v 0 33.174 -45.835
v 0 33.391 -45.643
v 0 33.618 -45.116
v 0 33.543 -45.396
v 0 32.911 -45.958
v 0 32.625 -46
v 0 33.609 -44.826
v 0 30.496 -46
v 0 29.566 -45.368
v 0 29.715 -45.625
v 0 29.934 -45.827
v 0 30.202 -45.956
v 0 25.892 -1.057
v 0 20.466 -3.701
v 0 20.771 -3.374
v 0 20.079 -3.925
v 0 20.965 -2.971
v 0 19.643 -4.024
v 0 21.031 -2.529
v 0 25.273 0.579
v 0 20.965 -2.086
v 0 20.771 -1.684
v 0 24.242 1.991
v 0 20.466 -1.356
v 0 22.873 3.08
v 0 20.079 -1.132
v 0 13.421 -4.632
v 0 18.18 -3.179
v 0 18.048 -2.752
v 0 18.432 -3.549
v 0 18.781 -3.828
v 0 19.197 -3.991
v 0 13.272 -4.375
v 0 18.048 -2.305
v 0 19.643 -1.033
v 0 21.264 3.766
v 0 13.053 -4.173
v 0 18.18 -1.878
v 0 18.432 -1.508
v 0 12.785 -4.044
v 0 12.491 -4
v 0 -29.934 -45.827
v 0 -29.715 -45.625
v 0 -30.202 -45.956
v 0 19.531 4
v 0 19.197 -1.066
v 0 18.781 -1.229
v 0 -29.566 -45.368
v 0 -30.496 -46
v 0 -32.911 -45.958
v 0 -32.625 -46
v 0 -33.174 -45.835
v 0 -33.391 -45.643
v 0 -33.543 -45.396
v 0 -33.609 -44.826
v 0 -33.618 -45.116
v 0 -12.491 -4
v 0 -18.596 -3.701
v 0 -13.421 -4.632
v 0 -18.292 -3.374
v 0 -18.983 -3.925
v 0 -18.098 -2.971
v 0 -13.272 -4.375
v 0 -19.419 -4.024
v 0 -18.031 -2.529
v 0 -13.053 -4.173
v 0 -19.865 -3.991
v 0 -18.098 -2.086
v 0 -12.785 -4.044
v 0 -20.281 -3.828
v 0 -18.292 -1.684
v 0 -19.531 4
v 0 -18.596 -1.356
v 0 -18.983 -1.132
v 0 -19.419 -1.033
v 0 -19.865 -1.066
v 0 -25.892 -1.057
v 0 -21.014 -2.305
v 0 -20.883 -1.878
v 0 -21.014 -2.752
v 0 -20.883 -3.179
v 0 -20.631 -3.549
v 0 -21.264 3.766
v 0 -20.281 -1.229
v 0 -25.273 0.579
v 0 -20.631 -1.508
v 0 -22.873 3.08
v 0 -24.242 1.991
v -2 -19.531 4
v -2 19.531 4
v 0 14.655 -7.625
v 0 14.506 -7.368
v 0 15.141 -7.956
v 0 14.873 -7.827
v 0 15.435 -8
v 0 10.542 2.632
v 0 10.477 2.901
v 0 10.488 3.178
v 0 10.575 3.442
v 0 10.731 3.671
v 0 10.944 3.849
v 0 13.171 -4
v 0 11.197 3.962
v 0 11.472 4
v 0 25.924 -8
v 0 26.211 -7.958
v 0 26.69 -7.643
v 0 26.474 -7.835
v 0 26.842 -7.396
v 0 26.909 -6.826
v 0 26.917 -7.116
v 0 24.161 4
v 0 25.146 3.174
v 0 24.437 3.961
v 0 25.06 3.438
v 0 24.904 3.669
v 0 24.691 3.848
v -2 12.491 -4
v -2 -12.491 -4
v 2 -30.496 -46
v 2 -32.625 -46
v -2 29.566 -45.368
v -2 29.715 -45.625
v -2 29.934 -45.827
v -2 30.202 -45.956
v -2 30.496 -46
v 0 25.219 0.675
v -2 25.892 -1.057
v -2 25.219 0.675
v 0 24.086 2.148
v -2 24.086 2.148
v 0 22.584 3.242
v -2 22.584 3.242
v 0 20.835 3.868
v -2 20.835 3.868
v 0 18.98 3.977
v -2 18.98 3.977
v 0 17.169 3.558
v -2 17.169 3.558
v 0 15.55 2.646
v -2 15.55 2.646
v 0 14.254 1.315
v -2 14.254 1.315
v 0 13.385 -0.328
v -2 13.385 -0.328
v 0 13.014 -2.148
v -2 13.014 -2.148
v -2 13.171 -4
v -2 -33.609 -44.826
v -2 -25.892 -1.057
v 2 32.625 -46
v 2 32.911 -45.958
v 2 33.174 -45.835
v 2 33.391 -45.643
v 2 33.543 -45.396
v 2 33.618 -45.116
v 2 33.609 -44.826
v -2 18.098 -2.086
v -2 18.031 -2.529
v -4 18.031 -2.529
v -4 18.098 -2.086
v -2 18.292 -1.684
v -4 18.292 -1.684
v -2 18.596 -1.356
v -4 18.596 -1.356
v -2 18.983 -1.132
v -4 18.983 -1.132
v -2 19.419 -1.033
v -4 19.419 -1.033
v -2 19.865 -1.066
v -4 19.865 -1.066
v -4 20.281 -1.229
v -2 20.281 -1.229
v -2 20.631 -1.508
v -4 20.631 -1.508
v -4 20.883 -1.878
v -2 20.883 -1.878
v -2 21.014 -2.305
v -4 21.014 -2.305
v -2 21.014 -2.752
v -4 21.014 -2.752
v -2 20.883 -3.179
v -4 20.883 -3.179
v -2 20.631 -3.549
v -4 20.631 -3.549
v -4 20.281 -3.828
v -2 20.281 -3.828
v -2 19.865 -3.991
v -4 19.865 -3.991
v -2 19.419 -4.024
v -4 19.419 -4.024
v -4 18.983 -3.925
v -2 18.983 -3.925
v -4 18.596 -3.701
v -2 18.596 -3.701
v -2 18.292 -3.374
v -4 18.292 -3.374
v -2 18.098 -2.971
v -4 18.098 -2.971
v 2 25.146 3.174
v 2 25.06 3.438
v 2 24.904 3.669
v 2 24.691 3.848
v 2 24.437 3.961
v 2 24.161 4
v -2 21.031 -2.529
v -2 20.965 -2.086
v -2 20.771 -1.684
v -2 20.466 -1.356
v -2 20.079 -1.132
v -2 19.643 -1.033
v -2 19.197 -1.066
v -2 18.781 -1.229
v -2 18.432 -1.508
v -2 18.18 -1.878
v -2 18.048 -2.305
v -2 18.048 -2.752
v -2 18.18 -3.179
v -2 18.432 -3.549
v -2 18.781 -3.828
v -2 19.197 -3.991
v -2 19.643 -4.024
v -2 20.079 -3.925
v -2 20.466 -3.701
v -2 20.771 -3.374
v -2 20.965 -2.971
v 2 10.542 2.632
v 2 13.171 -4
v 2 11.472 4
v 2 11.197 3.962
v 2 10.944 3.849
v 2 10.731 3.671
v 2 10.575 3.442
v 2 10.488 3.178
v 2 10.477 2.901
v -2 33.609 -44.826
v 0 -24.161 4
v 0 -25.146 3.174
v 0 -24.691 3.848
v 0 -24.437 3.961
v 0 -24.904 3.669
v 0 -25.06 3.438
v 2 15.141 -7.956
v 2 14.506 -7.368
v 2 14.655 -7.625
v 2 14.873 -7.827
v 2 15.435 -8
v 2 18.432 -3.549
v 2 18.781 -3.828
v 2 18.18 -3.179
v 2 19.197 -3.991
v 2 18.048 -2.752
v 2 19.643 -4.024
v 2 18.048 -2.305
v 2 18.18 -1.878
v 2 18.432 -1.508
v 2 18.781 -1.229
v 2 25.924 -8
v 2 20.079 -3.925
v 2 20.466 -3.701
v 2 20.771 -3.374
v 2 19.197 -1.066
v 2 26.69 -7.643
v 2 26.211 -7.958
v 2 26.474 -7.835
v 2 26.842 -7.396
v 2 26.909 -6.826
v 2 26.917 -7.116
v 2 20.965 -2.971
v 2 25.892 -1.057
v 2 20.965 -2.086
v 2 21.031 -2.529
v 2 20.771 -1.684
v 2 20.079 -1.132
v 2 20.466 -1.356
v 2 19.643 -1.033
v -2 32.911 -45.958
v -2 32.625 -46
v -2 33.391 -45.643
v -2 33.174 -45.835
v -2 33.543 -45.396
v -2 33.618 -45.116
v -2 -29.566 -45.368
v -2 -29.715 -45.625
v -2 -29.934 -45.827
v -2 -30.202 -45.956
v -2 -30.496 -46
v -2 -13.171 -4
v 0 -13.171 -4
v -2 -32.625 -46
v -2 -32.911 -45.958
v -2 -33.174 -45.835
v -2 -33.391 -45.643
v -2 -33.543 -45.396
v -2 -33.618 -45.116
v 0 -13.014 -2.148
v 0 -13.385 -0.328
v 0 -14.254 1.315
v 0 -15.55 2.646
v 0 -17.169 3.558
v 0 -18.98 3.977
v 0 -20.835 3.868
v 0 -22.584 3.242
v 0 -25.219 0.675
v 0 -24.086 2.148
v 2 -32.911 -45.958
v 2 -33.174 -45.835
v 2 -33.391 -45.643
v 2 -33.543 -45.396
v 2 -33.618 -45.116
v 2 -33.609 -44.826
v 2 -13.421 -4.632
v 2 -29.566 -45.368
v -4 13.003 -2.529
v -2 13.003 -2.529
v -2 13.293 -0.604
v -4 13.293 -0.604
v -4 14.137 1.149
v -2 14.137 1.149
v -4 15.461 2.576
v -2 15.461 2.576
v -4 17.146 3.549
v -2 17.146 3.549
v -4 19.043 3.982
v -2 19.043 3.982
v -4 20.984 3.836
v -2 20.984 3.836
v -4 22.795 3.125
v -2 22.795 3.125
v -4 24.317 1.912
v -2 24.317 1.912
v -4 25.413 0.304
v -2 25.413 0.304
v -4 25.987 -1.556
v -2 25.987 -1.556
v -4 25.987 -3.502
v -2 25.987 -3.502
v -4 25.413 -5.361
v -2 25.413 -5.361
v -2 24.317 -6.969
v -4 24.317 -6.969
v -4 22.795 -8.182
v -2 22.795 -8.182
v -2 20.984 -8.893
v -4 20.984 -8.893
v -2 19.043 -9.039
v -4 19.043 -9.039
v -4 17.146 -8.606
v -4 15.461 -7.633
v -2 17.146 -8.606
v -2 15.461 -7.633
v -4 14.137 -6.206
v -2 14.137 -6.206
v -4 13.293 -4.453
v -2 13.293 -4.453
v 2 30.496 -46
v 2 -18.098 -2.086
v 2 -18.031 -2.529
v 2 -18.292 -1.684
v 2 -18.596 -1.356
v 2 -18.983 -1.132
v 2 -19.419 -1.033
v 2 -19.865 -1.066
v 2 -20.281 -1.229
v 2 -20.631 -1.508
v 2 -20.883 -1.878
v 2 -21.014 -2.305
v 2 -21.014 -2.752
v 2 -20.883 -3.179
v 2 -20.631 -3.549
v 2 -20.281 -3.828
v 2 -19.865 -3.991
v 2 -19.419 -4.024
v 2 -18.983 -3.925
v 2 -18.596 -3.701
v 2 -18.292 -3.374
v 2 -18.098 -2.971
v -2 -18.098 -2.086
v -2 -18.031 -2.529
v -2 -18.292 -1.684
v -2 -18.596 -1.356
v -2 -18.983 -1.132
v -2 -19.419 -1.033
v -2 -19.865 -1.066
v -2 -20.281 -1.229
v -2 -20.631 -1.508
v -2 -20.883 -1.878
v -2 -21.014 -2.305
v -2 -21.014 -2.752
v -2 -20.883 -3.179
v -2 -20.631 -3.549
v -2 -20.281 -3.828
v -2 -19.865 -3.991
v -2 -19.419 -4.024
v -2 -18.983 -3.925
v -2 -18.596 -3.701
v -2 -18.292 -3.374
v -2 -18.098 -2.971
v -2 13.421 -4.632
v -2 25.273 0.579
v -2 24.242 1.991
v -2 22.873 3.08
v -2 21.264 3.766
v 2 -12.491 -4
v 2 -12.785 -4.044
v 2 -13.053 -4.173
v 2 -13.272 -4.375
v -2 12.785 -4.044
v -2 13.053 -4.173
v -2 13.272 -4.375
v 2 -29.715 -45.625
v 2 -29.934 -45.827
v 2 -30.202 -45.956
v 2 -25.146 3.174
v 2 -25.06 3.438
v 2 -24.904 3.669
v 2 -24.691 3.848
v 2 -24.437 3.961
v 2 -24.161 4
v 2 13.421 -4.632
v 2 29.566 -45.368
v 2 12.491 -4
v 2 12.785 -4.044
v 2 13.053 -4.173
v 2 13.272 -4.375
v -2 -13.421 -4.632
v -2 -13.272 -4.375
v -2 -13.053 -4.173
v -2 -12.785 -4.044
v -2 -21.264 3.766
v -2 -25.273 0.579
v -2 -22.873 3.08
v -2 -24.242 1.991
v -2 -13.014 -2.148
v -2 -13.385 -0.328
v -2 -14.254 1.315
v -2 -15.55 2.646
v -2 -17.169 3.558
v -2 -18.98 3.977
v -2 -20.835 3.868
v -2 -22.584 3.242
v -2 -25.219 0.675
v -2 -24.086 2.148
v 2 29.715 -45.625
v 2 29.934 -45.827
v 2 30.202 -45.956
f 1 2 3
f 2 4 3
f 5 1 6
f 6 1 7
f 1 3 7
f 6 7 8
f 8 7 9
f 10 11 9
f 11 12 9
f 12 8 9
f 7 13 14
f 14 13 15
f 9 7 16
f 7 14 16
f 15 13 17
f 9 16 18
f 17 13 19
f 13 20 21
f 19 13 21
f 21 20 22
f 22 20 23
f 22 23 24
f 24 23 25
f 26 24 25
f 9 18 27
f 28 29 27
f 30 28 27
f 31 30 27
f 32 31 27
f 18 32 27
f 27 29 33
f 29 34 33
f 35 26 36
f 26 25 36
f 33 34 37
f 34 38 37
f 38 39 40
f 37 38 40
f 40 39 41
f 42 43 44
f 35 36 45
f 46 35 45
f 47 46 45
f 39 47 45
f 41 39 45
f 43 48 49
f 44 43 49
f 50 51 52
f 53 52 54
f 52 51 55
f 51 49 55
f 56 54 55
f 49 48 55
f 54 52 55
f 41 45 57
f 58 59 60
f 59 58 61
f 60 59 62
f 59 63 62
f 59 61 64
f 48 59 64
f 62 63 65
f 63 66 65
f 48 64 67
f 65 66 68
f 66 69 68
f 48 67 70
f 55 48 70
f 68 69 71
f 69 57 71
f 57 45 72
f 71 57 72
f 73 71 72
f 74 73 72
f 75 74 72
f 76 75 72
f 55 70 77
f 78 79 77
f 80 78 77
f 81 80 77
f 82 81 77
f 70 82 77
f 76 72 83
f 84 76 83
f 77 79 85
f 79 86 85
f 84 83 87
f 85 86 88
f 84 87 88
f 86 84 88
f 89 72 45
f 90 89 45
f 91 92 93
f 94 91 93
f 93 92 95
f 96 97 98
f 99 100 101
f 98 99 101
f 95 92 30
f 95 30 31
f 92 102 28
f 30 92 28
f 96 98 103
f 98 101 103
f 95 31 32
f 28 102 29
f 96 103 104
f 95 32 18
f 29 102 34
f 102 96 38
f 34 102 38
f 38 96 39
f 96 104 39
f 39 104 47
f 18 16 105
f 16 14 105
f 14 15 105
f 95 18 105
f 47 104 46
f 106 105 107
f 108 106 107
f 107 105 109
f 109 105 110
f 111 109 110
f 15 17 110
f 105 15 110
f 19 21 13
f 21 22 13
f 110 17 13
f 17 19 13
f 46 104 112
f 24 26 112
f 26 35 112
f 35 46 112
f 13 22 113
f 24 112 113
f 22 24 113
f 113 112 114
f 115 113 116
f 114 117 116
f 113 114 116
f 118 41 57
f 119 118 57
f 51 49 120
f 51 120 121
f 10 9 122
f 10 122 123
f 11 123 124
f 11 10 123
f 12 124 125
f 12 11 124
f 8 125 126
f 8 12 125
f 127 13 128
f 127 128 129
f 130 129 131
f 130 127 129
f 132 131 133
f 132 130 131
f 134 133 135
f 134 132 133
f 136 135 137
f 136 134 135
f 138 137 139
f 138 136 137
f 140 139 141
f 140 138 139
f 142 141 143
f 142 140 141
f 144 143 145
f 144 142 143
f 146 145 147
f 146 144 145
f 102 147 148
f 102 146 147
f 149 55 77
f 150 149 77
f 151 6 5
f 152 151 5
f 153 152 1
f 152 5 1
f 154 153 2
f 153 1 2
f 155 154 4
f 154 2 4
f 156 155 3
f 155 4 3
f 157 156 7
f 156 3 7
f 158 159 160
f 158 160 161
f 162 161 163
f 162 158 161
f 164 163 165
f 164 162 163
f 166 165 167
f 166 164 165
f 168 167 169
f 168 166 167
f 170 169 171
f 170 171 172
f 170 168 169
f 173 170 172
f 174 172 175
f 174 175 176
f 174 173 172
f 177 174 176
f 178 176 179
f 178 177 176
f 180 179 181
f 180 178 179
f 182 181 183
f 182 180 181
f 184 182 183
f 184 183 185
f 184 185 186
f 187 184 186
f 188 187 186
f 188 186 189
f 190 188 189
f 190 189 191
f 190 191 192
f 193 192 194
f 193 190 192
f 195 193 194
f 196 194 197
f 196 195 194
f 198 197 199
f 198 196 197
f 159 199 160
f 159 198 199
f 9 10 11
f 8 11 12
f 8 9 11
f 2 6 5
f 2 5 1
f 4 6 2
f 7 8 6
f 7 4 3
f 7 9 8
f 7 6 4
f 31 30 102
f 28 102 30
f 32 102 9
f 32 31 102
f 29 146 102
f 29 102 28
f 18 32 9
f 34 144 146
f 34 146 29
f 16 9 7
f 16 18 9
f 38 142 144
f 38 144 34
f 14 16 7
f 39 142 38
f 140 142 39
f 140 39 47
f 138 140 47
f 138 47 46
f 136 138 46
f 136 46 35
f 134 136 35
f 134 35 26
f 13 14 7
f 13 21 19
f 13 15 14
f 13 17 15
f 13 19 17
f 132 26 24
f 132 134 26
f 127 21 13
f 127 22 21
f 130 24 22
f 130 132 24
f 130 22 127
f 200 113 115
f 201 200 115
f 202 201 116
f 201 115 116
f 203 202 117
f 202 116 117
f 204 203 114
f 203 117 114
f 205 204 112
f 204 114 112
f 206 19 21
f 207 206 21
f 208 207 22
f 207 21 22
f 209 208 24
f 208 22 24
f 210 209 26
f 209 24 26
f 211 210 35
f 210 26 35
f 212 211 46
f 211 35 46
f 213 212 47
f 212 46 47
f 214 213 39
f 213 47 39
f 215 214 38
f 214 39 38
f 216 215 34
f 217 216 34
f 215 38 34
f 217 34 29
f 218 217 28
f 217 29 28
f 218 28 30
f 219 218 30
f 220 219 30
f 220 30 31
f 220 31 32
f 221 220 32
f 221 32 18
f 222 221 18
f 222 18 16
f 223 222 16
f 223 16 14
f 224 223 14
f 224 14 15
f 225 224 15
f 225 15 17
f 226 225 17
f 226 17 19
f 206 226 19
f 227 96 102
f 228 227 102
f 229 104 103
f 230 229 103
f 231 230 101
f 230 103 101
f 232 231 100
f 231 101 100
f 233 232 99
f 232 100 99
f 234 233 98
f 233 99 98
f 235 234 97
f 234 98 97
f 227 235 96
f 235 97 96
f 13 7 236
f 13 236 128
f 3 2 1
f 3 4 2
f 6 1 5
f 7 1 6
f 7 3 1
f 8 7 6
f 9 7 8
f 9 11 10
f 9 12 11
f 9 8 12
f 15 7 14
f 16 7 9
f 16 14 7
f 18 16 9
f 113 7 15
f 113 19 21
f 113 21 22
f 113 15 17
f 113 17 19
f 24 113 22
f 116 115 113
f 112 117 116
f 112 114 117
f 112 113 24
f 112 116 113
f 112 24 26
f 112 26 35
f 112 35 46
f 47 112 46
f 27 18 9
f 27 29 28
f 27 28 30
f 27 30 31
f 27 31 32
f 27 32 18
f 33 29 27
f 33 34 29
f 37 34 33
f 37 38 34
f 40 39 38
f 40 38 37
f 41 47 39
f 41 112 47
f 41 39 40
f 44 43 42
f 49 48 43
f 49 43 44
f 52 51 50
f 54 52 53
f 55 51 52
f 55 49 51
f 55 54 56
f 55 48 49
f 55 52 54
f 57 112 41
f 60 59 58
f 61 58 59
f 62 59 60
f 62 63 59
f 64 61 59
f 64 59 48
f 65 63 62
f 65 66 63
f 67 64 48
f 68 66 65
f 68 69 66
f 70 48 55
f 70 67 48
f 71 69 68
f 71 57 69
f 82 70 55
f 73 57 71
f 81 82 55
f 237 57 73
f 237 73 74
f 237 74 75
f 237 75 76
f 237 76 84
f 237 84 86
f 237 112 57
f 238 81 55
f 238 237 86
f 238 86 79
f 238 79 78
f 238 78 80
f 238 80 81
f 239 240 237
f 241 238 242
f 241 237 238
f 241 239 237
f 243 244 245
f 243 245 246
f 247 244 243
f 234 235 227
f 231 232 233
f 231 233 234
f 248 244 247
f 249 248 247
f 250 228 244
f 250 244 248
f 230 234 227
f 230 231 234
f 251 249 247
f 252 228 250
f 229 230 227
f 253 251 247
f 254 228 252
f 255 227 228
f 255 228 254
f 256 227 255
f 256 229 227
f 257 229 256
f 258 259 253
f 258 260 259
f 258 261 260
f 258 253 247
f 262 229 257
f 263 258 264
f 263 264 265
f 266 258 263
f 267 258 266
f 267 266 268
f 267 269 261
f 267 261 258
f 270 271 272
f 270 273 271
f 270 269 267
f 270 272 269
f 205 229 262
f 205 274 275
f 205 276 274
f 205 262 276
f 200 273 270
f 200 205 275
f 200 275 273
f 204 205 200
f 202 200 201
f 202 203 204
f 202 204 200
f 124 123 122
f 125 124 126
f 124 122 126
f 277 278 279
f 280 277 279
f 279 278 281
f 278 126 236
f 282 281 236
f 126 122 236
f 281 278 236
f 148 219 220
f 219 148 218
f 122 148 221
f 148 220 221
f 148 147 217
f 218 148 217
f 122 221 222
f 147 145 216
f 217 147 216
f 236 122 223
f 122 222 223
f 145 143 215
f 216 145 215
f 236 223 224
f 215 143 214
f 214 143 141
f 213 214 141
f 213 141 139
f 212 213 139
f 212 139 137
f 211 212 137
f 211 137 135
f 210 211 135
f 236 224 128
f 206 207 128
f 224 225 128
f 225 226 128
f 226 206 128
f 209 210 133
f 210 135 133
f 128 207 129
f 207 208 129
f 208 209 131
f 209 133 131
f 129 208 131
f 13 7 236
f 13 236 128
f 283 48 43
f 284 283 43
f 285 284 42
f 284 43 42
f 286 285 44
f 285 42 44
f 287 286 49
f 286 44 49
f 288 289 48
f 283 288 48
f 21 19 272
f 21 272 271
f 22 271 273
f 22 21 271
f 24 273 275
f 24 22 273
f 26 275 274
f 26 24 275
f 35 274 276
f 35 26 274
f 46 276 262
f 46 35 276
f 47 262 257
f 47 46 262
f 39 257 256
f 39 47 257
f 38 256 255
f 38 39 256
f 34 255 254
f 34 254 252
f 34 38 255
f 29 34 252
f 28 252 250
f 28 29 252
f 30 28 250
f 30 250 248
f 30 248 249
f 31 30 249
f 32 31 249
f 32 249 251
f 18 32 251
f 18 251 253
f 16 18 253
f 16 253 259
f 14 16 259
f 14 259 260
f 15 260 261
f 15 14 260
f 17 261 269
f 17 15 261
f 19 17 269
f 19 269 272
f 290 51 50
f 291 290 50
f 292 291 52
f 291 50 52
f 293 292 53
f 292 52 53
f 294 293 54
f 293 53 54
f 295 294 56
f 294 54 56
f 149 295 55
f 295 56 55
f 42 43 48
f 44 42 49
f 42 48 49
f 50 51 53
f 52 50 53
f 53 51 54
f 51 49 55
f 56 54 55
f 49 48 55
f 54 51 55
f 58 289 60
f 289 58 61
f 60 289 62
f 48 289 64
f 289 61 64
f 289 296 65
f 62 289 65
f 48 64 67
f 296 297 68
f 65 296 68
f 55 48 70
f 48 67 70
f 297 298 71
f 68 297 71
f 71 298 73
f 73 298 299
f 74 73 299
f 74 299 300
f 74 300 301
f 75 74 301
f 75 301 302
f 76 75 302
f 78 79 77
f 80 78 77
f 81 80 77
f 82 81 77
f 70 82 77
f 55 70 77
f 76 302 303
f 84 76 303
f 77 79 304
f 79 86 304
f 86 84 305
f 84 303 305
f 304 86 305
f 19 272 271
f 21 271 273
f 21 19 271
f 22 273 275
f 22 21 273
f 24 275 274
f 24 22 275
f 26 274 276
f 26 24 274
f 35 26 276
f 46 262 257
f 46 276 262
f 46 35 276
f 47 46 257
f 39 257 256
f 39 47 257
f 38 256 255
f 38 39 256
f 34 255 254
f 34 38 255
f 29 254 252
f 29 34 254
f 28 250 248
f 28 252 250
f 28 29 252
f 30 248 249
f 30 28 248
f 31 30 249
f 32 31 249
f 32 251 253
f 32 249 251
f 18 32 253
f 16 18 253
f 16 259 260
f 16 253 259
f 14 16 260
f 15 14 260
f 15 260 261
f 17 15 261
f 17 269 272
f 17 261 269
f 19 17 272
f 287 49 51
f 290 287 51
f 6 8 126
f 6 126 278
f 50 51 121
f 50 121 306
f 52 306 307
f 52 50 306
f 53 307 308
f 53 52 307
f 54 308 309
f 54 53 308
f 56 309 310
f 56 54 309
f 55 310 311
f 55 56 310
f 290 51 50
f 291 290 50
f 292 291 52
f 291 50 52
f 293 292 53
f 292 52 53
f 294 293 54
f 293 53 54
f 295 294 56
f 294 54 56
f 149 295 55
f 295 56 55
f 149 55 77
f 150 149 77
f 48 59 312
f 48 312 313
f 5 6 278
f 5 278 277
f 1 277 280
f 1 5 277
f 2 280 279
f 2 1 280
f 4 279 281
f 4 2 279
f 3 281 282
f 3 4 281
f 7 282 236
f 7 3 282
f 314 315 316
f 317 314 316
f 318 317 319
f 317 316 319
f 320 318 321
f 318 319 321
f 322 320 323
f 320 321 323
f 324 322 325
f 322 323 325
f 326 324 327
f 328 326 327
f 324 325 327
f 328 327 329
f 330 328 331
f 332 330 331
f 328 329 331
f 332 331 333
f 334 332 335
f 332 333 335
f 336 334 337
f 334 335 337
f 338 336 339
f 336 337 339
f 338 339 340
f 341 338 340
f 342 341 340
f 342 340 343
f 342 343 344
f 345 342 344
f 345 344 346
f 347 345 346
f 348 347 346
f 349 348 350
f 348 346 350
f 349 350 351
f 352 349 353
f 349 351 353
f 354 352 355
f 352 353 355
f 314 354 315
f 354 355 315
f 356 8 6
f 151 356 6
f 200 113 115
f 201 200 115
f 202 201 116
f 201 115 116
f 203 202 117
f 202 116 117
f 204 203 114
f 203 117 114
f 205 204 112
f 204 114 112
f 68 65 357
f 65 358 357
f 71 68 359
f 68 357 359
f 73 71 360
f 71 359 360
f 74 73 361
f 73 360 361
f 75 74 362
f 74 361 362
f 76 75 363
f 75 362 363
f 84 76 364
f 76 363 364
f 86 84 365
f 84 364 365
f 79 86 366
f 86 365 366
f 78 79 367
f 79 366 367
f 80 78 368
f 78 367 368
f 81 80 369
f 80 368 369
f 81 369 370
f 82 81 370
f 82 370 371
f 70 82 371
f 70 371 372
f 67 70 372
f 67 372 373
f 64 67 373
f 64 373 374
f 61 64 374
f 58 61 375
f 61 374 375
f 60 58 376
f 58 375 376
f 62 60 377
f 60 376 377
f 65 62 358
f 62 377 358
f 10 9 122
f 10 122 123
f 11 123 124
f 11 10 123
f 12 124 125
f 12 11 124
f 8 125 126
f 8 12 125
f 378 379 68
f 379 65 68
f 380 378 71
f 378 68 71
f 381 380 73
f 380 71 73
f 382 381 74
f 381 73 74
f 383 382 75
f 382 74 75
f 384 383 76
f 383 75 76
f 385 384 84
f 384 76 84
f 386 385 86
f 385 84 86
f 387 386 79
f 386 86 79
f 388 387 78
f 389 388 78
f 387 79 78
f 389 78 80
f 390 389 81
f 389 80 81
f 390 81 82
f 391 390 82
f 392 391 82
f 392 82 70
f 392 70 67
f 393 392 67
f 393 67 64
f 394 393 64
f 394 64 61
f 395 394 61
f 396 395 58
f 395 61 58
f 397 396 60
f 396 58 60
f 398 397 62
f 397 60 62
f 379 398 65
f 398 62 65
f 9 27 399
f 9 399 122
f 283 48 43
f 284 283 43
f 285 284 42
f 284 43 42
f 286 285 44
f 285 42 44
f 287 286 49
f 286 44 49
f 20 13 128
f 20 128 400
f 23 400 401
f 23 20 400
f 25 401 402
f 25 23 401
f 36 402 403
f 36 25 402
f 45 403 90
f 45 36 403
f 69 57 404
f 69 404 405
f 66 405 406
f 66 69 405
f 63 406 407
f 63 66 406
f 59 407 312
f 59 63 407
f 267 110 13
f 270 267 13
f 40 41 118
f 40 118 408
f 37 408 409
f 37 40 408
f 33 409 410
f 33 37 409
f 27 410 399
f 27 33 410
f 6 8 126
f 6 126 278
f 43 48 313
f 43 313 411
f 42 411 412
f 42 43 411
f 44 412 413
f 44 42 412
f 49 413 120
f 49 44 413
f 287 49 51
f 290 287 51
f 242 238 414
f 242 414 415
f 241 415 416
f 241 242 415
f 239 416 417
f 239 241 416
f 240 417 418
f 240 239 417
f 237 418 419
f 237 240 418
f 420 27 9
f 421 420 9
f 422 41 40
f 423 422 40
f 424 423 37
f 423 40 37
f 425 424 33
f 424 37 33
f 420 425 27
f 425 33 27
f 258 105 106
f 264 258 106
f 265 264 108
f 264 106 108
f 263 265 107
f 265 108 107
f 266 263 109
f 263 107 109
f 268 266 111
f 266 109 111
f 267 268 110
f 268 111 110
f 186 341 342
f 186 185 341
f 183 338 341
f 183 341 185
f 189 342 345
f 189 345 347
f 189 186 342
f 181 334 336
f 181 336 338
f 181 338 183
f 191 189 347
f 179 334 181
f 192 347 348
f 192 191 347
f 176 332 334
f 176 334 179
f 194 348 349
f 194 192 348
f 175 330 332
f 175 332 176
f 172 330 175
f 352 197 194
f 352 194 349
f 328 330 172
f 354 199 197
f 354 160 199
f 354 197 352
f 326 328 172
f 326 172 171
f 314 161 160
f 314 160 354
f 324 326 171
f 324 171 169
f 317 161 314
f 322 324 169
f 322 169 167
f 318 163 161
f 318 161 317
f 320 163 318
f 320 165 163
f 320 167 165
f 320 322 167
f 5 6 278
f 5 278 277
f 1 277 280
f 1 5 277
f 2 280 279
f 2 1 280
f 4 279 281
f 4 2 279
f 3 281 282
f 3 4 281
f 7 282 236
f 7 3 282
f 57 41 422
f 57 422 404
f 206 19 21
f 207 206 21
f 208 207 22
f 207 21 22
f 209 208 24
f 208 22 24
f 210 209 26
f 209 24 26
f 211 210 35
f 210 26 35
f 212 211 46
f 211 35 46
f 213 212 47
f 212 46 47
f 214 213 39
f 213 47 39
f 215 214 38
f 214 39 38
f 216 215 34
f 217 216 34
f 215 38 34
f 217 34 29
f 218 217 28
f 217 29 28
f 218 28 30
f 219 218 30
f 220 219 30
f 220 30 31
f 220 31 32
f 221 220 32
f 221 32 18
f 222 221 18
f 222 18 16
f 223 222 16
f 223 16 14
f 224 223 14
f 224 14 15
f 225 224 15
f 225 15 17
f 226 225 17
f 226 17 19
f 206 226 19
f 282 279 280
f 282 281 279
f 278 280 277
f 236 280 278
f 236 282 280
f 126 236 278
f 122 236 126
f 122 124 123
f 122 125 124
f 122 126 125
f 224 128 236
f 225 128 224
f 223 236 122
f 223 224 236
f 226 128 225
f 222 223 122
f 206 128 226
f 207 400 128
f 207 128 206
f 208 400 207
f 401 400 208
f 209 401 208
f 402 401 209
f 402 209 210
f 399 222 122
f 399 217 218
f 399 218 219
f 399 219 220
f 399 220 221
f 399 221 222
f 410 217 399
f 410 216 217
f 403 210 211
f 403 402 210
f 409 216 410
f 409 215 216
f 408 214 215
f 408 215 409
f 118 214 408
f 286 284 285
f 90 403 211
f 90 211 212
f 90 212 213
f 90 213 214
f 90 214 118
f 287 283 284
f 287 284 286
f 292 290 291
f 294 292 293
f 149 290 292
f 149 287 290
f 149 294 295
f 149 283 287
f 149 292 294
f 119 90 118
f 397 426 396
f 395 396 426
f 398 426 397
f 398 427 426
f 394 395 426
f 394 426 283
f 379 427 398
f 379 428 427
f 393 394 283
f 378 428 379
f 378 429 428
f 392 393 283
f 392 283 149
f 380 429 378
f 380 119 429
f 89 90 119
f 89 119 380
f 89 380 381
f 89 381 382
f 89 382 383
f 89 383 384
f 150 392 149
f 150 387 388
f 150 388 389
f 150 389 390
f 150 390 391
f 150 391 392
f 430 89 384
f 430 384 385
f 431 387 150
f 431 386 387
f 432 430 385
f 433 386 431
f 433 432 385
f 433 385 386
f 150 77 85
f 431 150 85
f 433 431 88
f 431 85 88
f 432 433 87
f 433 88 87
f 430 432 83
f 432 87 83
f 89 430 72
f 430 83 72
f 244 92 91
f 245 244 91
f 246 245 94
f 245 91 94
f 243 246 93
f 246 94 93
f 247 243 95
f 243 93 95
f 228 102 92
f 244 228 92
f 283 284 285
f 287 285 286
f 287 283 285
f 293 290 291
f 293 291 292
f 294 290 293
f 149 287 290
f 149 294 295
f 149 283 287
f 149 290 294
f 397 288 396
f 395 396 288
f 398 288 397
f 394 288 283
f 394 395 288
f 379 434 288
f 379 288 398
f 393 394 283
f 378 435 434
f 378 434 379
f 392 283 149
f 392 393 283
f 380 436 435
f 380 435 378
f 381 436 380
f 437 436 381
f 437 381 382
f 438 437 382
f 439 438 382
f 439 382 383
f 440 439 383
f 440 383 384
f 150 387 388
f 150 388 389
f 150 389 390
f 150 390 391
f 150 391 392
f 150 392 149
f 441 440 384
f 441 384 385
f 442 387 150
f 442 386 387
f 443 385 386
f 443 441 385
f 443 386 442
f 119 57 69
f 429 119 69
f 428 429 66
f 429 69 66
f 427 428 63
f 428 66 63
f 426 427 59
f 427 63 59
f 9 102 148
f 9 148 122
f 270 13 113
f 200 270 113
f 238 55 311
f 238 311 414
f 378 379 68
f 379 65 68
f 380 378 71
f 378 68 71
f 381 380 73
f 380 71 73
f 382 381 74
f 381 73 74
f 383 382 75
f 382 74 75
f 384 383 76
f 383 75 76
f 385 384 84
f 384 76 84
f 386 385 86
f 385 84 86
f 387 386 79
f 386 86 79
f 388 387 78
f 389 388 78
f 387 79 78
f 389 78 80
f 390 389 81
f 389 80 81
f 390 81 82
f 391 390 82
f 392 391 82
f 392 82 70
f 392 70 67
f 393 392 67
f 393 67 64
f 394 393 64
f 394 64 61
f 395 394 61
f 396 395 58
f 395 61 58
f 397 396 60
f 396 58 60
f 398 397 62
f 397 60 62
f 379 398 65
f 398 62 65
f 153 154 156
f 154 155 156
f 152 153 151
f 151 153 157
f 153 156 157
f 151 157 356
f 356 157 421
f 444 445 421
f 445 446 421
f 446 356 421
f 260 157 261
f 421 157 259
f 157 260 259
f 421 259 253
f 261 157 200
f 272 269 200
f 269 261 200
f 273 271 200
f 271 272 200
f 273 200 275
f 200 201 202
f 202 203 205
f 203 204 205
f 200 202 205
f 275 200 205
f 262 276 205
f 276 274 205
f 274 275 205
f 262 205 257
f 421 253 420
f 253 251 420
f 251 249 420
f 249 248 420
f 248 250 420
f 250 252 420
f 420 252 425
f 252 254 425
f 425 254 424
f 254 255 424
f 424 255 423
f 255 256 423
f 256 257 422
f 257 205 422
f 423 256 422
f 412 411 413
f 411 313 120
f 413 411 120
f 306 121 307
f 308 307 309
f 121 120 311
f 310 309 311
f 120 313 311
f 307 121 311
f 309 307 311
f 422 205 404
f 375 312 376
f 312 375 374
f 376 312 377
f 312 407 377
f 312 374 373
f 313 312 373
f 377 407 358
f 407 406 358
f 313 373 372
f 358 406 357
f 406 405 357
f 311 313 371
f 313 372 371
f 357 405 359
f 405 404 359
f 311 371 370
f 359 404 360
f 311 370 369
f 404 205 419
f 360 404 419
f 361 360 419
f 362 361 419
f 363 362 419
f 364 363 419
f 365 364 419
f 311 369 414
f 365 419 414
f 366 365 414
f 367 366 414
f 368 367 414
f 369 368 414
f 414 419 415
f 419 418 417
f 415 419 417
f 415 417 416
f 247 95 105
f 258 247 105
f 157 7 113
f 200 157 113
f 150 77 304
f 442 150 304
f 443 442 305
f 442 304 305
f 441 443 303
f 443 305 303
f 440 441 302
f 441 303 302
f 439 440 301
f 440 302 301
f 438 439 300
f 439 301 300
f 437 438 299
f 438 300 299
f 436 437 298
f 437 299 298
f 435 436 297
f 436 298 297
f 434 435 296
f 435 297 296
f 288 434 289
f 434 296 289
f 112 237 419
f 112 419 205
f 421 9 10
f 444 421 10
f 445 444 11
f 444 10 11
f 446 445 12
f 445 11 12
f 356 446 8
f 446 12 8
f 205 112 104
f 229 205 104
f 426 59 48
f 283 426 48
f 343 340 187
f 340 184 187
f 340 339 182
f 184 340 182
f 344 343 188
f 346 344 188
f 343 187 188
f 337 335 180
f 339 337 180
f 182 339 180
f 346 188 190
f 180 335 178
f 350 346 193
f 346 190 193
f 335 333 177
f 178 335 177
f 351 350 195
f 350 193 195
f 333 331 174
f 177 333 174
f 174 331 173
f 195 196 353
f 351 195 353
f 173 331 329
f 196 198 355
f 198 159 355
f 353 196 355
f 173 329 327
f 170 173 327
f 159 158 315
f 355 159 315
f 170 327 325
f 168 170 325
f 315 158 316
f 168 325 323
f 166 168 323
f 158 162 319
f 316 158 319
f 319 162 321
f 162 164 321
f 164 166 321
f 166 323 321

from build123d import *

# Parameters (mm, degrees)
F5_DEPTH  = 2
F7_DEPTH  = 2
F9_DEPTH  = 2
F3_R      = 1.5
F11_DEPTH = 12.5
F12_R     = 6.5285293344
F12_R_2   = 1.5
F13_DEPTH = 2
F4_R      = 1.5
F14_DEPTH = 2


with BuildPart() as f5:
    # F0 (on Right) → F5 (new body)
    with BuildSketch(Plane.YZ):
        with BuildLine():
            Line((33.6094031958, -44.8263518223), (25.1457081218, 3.1736481777))
            ThreePointArc((25.1457081218, 3.1736481777), (24.8036879785, 3.7660444431), (24.1609003688, 4))
            Line((24.1609003688, 4), (10, 4))
            Line((10, 4), (0, 4))
            Line((0, 4), (0, -4))
            Line((0, -4), (12.491268584, -4))
            ThreePointArc((12.491268584, -4), (13.0532093409, -4.1728225186), (13.420918064, -4.6315548285))
            Line((13.420918064, -4.6315548285), (29.5660468171, -45.3684451715))
            ThreePointArc((29.5660468171, -45.3684451715), (29.9337555402, -45.8271774814), (30.4956962971, -46))
            Line((30.4956962971, -46), (32.6245954428, -46))
            ThreePointArc((32.6245954428, -46), (33.3906398859, -45.6427876097), (33.6094031958, -44.8263518223))
        make_face()
    extrude(amount=F5_DEPTH)

    # F6: F5 across plane


with BuildPart() as f5_1:
    add(f5.part)
    add(f5.part.mirror(Plane.XZ))


with BuildPart() as f7:
    # F1 (on Right) → F7 (new body)
    with BuildSketch(Plane.YZ):
        with BuildLine():
            Line((33.6094031958, -44.8263518223), (25.8916958863, -1.0570586688))
            ThreePointArc((25.8916958863, -1.0570586688), (23.5941077402, 2.5816680529), (19.531155866, 4))
            Line((19.531155866, 4), (10, 4))
            Line((10, 4), (0, 4))
            Line((0, 4), (0, -4))
            Line((0, -4), (12.491268584, -4))
            ThreePointArc((12.491268584, -4), (13.0532093409, -4.1728225186), (13.420918064, -4.6315548285))
            Line((13.420918064, -4.6315548285), (29.5660468171, -45.3684451715))
            ThreePointArc((29.5660468171, -45.3684451715), (29.9337555402, -45.8271774814), (30.4956962971, -46))
            Line((30.4956962971, -46), (32.6245954428, -46))
            ThreePointArc((32.6245954428, -46), (33.3906398859, -45.6427876097), (33.6094031958, -44.8263518223))
        make_face()
    extrude(amount=-F7_DEPTH)

    # F8: F7 across plane


with BuildPart() as f7_1:
    add(f7.part)
    add(f7.part.mirror(Plane.XZ))


with BuildPart() as f9:
    # F2 (on Right) → F9 (new body)
    with BuildSketch(Plane.YZ):
        with BuildLine():
            Line((33.6094031958, -44.8263518223), (25.8916958863, -1.0570586688))
            ThreePointArc((25.8916958863, -1.0570586688), (18.0596852004, 3.8320106859), (13.1706158457, -4))
            Line((13.1706158457, -4), (29.5660468171, -45.3684451715))
            ThreePointArc((29.5660468171, -45.3684451715), (29.9337555402, -45.8271774814), (30.4956962971, -46))
            Line((30.4956962971, -46), (32.6245954428, -46))
            ThreePointArc((32.6245954428, -46), (33.3906398859, -45.6427876097), (33.6094031958, -44.8263518223))
        make_face()
    extrude(amount=-F9_DEPTH)


with BuildPart() as f10_1:
    # F10: instance of F9
    add(f9.part.mirror(Plane.XZ))


with BuildPart() as f11_tool:
    # F3 (on Right) → F11 (new body, symmetric)
    with BuildSketch(Plane.YZ):
        with Locations((19.531155866, -2.5285293344)):
            Circle(F3_R)
        with Locations((-19.531155866, -2.5285293344)):
            Circle(F3_R)
    extrude(amount=F11_DEPTH, both=True)


with BuildPart() as f5_2:
    add(f5_1.part)

    # F11: cut by f11_tool
    add(f11_tool.part, mode=Mode.SUBTRACT)


with BuildPart() as f7_2:
    add(f7_1.part)

    # F11: cut by f11_tool
    add(f11_tool.part, mode=Mode.SUBTRACT)


with BuildPart() as f9_1:
    add(f9.part)

    # F11: cut by f11_tool
    add(f11_tool.part, mode=Mode.SUBTRACT)


with BuildPart() as f10_1_1:
    add(f10_1.part)

    # F11: cut by f11_tool
    add(f11_tool.part, mode=Mode.SUBTRACT)


with BuildPart() as f13:
    # F12 (on face) → F13 (new body)
    with BuildSketch(Plane(origin=(-2, 0, 0), x_dir=(0, -1, 0), z_dir=(-1, 0, 0))):
        with Locations((-19.531155866, -2.5285293344)):
            Circle(F12_R)
        with Locations((-19.531155866, -2.5285293344)):
            Circle(F12_R_2, mode=Mode.SUBTRACT)
    extrude(amount=F13_DEPTH)


with BuildPart() as f14:
    # F4 (on Right) → F14 (new body)
    with BuildSketch(Plane.YZ):
        with BuildLine():
            Line((26.9089779289, -6.8263518223), (25.8916958863, -1.0570586688))
            Line((25.8916958863, -1.0570586688), (25.1457081218, 3.1736481777))
            ThreePointArc((25.1457081218, 3.1736481777), (24.8036879785, 3.7660444431), (24.1609003688, 4))
            Line((24.1609003688, 4), (19.531155866, 4))
            Line((19.531155866, 4), (11.4720012231, 4))
            ThreePointArc((11.4720012231, 4), (10.6448237416, 3.5619407569), (10.5423517431, 2.6315548285))
            Line((10.5423517431, 2.6315548285), (13.1706158457, -4))
            Line((13.1706158457, -4), (14.5056215502, -7.3684451715))
            ThreePointArc((14.5056215502, -7.3684451715), (14.8733302733, -7.8271774814), (15.4352710301, -8))
            Line((15.4352710301, -8), (25.9241701759, -8))
            ThreePointArc((25.9241701759, -8), (26.690214619, -7.6427876097), (26.9089779289, -6.8263518223))
        make_face()
        with Locations((19.531155866, -2.5285293344)):
            Circle(F4_R, mode=Mode.SUBTRACT)
    extrude(amount=F14_DEPTH)


solid = Compound([f5_2.part, f7_2.part, f9_1.part, f10_1_1.part, f13.part, f14.part])
